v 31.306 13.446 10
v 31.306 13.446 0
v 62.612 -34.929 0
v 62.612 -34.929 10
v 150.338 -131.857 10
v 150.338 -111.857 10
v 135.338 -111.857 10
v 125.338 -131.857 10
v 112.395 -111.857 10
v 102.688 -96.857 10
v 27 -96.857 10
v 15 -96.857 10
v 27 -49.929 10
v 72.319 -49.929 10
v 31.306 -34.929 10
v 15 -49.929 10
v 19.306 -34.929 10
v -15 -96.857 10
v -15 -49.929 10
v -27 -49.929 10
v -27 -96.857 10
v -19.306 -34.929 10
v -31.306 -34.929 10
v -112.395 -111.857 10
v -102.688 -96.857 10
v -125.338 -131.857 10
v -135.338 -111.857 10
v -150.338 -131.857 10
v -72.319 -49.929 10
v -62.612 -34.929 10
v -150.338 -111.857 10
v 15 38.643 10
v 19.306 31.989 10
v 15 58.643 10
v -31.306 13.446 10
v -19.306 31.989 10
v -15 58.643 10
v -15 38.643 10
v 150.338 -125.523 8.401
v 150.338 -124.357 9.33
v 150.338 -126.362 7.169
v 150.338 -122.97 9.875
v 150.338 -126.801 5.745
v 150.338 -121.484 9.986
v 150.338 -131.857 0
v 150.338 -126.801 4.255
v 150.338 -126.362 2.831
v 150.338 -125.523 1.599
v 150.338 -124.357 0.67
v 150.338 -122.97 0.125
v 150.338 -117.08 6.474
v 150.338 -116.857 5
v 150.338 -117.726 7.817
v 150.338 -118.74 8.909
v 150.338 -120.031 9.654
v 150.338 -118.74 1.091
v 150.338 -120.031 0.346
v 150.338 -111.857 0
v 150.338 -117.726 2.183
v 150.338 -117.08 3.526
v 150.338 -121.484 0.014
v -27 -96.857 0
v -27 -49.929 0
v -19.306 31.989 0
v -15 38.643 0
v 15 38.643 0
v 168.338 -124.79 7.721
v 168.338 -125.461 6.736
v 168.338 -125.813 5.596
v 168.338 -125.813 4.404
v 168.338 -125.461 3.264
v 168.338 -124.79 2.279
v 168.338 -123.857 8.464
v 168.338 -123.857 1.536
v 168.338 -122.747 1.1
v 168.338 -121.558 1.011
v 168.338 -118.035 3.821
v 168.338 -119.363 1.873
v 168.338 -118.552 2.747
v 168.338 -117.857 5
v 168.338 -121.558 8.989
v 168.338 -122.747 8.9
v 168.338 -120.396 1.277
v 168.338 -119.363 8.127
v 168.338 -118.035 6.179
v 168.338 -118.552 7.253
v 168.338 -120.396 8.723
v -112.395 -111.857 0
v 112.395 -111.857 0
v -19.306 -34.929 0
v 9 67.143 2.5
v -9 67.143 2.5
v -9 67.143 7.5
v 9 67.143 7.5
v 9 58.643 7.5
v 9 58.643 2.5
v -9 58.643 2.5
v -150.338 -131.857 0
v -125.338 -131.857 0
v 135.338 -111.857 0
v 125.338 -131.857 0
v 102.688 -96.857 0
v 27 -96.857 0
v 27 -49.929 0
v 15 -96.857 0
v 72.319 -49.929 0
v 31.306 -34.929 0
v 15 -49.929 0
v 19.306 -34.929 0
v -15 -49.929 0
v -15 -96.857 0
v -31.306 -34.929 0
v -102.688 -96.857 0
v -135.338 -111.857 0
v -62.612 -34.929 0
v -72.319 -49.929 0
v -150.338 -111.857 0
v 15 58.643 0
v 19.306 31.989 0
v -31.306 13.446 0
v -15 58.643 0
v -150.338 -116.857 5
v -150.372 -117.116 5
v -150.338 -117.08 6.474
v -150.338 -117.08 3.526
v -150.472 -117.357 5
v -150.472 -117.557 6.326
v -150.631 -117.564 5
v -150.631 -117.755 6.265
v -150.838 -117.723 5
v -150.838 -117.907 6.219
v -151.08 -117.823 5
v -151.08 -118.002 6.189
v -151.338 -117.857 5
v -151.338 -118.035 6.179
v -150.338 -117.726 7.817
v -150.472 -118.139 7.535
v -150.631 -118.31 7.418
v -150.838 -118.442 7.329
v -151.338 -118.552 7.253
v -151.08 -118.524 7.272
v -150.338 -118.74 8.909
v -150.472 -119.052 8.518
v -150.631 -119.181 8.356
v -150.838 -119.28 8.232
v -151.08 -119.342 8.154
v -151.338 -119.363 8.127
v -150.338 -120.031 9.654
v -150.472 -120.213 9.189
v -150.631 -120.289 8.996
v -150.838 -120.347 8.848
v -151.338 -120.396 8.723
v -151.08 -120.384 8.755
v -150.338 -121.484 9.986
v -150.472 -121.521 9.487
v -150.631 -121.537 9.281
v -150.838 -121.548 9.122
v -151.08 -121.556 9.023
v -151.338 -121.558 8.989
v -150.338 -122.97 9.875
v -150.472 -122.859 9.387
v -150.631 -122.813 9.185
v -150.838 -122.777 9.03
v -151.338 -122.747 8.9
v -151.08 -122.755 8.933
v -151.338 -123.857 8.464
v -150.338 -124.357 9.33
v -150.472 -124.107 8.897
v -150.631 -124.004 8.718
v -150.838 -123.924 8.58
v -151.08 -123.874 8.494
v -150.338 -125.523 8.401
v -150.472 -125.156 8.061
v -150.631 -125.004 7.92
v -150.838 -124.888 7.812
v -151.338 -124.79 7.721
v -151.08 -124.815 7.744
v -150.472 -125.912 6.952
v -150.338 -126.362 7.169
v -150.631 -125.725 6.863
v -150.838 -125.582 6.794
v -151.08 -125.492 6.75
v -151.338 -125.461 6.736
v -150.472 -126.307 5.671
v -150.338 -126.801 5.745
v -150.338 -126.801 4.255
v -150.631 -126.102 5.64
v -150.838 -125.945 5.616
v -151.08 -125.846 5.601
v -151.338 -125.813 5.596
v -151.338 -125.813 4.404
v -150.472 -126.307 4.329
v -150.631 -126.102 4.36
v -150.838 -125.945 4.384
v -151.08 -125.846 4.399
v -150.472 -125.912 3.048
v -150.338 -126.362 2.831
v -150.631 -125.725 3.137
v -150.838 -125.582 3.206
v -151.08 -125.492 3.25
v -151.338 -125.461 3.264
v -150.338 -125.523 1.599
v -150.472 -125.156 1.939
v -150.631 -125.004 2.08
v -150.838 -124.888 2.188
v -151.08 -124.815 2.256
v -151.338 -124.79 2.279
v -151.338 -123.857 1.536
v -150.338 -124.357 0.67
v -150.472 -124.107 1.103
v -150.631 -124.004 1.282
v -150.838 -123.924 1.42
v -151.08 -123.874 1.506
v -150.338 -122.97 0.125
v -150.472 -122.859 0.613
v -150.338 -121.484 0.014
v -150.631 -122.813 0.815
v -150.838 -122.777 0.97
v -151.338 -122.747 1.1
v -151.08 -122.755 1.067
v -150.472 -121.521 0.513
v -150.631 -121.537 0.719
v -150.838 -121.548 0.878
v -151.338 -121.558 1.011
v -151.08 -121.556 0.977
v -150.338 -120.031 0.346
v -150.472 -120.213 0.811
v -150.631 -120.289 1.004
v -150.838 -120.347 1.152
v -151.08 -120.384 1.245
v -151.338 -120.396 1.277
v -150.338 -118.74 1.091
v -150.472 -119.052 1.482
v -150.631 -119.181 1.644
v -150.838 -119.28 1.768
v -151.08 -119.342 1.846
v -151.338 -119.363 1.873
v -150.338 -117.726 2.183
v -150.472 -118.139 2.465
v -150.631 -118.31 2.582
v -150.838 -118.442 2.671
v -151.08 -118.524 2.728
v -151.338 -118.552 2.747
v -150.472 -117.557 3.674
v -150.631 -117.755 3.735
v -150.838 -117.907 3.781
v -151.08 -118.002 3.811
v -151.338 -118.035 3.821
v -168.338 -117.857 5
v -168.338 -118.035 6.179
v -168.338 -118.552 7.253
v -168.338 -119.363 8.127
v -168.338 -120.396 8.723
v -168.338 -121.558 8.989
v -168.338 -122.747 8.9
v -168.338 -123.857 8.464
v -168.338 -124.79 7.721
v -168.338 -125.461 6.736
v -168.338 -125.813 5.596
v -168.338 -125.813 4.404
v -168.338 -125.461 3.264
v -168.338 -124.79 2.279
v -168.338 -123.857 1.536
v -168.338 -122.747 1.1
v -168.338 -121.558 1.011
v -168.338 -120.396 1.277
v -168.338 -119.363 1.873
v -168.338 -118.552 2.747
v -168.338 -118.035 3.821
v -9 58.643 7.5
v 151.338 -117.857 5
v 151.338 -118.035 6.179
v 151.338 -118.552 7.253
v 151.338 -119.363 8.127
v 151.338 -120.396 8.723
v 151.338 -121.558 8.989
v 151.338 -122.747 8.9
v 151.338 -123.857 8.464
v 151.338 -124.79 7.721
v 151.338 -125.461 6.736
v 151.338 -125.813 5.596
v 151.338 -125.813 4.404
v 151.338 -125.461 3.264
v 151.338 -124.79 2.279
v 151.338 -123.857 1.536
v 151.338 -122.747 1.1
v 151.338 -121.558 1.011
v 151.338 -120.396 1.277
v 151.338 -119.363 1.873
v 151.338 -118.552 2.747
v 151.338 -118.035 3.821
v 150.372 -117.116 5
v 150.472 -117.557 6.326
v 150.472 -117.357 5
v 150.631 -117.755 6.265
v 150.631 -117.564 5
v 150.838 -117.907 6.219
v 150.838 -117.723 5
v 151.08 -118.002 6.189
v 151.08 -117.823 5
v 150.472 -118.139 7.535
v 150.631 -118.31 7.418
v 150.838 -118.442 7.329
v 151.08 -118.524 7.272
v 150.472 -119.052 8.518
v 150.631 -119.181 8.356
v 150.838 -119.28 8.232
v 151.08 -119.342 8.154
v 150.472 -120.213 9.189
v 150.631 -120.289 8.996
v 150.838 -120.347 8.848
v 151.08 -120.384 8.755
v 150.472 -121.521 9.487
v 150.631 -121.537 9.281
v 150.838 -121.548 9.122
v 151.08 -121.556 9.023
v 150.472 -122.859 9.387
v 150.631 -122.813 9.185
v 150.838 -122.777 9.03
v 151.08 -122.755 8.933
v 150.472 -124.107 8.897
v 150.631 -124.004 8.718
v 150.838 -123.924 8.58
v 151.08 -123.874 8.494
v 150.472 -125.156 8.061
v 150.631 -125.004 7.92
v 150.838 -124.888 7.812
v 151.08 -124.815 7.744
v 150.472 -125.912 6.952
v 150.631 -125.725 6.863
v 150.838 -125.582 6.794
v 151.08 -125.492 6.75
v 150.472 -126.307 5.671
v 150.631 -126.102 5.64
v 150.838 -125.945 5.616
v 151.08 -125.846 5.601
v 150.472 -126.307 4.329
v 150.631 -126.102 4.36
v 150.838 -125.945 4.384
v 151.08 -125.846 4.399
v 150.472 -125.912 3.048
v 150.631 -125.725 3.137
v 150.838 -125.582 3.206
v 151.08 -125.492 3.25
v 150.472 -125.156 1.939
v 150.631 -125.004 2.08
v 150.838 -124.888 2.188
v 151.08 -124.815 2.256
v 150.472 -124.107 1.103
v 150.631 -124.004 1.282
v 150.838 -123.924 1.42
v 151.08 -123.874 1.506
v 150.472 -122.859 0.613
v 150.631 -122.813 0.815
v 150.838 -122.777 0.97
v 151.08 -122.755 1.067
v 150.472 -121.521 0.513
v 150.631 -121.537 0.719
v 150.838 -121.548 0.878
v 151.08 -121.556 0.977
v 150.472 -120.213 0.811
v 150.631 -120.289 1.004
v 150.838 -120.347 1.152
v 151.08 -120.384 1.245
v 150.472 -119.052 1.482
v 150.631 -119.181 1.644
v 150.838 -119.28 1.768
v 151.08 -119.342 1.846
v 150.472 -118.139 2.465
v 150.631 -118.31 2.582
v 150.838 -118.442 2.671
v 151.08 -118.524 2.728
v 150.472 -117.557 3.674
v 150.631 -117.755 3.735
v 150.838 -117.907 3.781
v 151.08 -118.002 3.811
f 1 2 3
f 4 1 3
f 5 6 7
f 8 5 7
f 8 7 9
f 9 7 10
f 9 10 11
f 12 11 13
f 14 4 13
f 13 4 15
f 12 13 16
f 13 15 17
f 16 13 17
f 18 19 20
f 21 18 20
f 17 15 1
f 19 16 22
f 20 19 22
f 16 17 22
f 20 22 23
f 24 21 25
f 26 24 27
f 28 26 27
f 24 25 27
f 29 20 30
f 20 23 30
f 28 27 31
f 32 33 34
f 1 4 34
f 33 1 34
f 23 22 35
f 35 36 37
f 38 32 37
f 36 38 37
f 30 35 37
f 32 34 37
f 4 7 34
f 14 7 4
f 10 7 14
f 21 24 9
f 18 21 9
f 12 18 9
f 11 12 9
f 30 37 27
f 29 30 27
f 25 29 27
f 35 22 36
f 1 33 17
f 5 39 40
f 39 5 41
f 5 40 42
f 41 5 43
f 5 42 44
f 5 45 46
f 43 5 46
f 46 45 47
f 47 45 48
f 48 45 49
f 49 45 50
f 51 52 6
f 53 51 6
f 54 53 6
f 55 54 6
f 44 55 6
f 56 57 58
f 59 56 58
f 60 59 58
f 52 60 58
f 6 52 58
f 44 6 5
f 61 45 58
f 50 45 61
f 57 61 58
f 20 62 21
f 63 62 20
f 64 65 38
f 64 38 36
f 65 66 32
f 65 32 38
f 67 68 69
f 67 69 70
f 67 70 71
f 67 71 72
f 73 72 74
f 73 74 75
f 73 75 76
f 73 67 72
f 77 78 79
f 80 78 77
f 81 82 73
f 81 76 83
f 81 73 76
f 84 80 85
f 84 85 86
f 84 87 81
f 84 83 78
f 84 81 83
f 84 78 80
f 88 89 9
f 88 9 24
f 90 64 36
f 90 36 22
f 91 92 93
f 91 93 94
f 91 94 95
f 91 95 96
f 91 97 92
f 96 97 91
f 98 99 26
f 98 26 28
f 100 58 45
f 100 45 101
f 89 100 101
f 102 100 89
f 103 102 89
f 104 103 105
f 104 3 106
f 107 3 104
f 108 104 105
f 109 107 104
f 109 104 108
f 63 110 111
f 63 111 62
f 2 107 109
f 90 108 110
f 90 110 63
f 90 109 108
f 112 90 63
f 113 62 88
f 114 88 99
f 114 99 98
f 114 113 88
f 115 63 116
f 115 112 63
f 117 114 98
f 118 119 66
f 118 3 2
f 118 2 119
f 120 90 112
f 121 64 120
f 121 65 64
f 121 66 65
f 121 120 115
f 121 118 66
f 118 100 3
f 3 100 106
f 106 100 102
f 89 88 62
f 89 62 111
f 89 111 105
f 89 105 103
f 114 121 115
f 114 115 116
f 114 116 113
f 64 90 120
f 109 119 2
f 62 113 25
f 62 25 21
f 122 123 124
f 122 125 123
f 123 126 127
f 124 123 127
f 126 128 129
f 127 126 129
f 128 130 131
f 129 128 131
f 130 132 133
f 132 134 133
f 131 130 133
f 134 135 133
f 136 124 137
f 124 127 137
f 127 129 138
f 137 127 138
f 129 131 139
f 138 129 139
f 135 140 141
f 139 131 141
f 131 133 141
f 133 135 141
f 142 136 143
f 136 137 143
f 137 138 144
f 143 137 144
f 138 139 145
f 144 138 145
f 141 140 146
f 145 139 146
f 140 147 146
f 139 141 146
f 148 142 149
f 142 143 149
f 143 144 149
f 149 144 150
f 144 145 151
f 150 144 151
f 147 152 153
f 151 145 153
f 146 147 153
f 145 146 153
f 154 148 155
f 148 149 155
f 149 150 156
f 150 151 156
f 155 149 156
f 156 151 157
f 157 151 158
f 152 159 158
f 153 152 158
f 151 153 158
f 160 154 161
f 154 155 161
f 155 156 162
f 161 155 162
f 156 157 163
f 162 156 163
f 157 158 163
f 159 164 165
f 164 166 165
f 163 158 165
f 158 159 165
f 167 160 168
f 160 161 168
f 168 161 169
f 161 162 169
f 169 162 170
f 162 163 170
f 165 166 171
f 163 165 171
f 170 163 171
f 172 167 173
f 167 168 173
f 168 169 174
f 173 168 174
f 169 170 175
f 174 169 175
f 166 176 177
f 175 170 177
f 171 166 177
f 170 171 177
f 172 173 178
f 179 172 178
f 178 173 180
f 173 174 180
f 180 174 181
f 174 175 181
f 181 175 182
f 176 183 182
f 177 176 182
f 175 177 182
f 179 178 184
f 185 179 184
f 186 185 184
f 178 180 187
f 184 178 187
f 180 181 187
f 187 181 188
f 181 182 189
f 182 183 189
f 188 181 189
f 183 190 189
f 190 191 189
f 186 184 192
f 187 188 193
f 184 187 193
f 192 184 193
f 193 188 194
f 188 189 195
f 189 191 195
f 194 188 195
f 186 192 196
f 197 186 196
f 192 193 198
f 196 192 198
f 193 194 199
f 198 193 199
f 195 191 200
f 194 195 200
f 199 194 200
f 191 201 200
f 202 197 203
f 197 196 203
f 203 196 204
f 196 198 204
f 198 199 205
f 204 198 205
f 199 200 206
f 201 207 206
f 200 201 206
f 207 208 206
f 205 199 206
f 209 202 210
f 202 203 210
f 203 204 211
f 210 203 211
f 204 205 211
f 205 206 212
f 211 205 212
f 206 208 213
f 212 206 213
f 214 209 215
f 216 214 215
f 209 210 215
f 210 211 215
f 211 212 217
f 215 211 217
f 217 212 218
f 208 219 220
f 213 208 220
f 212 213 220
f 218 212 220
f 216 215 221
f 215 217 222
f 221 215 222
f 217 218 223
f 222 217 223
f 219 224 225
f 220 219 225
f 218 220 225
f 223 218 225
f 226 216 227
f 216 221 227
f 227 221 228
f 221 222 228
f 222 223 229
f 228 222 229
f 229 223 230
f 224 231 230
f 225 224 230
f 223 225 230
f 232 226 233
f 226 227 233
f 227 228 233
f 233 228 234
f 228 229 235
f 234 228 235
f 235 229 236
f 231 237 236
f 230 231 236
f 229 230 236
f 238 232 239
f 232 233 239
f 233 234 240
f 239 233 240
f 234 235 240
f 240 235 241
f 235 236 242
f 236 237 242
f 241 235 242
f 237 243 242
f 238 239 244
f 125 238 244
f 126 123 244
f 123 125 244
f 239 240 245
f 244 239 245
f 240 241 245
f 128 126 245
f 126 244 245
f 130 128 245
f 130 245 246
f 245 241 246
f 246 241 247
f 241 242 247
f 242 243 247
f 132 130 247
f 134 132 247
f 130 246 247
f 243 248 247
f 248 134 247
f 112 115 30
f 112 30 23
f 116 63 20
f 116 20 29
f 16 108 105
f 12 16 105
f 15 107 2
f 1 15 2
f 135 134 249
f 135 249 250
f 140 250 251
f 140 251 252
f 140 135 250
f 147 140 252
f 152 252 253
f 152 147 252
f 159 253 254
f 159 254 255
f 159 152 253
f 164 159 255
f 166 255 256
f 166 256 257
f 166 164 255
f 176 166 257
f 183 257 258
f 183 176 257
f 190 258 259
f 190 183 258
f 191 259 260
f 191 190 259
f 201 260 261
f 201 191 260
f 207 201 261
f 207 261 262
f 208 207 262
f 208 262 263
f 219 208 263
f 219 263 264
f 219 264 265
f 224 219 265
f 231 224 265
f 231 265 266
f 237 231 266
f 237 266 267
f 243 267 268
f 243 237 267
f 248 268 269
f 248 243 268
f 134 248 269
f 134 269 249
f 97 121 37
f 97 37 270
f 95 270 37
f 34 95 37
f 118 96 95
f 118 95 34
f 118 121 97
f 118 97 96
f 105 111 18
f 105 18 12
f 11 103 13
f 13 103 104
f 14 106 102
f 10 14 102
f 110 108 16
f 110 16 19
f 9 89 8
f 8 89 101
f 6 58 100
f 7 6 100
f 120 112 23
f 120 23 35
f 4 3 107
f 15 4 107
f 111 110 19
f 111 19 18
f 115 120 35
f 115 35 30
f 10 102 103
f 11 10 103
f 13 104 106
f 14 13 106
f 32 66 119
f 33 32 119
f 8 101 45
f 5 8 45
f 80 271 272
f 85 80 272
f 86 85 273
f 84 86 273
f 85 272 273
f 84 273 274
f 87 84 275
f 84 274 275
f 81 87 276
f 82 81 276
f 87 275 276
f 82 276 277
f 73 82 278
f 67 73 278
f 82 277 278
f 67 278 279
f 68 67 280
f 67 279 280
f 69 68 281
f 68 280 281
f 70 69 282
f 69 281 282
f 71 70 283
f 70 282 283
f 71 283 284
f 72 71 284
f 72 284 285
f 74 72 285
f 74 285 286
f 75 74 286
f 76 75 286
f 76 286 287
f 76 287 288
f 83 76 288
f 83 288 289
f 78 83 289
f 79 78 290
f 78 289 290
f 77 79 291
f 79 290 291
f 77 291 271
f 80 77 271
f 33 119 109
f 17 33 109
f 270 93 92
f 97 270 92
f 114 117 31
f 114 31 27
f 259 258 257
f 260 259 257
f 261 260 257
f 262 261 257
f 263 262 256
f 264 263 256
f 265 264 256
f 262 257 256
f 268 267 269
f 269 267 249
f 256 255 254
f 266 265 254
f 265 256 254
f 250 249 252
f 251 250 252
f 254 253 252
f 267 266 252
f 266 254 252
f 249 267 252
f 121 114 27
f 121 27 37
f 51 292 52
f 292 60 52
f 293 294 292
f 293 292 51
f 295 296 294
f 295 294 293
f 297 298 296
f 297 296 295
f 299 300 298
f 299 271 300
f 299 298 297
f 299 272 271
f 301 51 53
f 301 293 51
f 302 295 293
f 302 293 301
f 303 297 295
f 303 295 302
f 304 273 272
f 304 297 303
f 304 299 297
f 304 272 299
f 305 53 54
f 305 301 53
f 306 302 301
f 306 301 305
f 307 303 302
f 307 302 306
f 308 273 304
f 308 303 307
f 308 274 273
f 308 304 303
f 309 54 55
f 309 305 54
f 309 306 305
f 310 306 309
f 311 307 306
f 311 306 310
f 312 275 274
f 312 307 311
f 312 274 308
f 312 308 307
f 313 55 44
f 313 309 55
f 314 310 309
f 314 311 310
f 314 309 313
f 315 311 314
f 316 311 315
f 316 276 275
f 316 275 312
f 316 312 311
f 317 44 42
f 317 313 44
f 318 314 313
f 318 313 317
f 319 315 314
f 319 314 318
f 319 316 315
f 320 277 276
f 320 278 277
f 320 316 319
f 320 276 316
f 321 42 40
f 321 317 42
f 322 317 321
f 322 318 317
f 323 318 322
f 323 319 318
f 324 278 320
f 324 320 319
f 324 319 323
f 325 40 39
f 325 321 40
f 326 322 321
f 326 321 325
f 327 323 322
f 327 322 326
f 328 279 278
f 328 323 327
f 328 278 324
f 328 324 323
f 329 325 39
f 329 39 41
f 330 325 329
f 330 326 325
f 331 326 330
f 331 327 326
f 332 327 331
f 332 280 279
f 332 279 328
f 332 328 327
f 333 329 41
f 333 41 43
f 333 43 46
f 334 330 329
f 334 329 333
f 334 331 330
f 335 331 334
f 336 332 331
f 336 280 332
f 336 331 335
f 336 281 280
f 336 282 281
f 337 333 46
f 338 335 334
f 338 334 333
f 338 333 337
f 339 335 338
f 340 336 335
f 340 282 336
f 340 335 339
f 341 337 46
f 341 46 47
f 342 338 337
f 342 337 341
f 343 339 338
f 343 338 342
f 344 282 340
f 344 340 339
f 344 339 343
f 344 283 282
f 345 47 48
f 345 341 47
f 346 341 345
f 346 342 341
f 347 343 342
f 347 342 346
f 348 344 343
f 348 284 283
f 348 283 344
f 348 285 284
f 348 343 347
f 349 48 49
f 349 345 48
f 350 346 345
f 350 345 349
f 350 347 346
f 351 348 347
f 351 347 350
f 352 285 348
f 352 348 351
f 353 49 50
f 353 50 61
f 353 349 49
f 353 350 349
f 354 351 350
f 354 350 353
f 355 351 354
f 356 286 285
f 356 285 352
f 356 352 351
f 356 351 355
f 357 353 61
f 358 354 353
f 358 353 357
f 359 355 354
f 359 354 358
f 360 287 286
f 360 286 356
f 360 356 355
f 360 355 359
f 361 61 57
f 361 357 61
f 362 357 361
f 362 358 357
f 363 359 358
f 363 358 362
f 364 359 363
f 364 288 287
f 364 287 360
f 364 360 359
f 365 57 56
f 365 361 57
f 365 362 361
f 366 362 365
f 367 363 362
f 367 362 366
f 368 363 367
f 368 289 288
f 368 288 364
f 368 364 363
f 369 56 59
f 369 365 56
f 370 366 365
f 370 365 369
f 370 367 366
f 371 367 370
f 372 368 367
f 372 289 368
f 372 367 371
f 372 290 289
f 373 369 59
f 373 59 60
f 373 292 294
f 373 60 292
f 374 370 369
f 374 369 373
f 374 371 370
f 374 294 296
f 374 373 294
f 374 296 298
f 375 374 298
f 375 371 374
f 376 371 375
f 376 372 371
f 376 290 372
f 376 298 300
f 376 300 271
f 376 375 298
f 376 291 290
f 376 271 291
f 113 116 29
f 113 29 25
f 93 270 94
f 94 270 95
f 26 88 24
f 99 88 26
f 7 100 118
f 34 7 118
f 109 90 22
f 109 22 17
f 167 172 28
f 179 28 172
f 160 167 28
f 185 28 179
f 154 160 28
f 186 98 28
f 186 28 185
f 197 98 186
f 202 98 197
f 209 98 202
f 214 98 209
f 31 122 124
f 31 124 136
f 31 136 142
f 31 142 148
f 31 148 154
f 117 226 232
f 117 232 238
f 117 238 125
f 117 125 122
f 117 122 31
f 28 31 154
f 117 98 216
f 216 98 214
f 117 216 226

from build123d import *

# Parameters (mm, degrees)
BOSS_EXTRUDE1_DEPTH  = 10
SKETCH6_R            = 4
BOSS_EXTRUDE3_DEPTH  = 18
FILLET2_R            = 1
FILLET2_OF_MIRROR1_R = 1
SKETCH7_W            = 18
SKETCH7_H            = 5
BOSS_EXTRUDE4_DEPTH  = 8.5


with BuildPart() as part:
    # Sketch2 → Boss-Extrude1 (new body)
    with BuildSketch(Plane.XY):
        Polygon((0, 58.642667291), (0, 38.642667291), (15, 38.642667291), (19.305964995, 31.988891988), (19.305964995, -34.929478391), (0, -34.929478391), (0, -49.929478391), (15, -49.929478391), (15, -96.857332709), (0, -96.857332709), (0, -111.857332709), (112.395493867, -111.857332709), (125.33841664, -131.857332709), (150.33841664, -131.857332709), (150.33841664, -111.857332709), (135.33841664, -111.857332709), (15, 58.642667291), align=None)
        Polygon((27, -49.929478391), (72.31912207, -49.929478391), (102.688301787, -96.857332709), (27, -96.857332709), align=None, mode=Mode.SUBTRACT)
        Polygon((31.305964995, -34.929478391), (31.305964995, 13.445939657), (62.61192999, -34.929478391), align=None, mode=Mode.SUBTRACT)
    boss_extrude1 = extrude(amount=BOSS_EXTRUDE1_DEPTH)

    # Sketch6 → Boss-Extrude3 (add)
    with BuildSketch(Plane(origin=(150.33841664, 0, 0), x_dir=(0, 0, -1), z_dir=(1, 0, 0))):
        with Locations(Location((-5, -121.857332709, 0), (0, 0, 90))):
            Circle(SKETCH6_R)
    boss_extrude3 = extrude(amount=BOSS_EXTRUDE3_DEPTH)

    # Fillet2
    fillet2_edges = [part.edges().sort_by_distance(p)[0] for p in [
        (150.33841664, -125.857332709, 5),
    ]]
    fillet(fillet2_edges, radius=FILLET2_R - 0.0001)  # a hair under: the kernel refuses the full size

    # Mirror1: Boss-Extrude1, Boss-Extrude3 across plane
    add(boss_extrude1.mirror(Plane(origin=(0, 0, 10), x_dir=(0, 0, 1), z_dir=(1, 0, 0))))
    add(boss_extrude3.mirror(Plane(origin=(0, 0, 10), x_dir=(0, 0, 1), z_dir=(1, 0, 0))))

    # Fillet2 of Mirror1
    fillet2_of_mirror1_edges = [part.edges().sort_by_distance(p)[0] for p in [
        (-150.33841664, -125.857332709, 5),
    ]]
    fillet(fillet2_of_mirror1_edges, radius=FILLET2_OF_MIRROR1_R - 0.0001)  # a hair under: the kernel refuses the full size

    # Sketch7 → Boss-Extrude4 (add)
    with BuildSketch(Plane(origin=(0, 58.642667291, 0), x_dir=(1, 0, 0), z_dir=(0, 1, 0))):
        with Locations((0, -5)):
            Rectangle(SKETCH7_W, SKETCH7_H)
    extrude(amount=BOSS_EXTRUDE4_DEPTH)


solid = part.part
